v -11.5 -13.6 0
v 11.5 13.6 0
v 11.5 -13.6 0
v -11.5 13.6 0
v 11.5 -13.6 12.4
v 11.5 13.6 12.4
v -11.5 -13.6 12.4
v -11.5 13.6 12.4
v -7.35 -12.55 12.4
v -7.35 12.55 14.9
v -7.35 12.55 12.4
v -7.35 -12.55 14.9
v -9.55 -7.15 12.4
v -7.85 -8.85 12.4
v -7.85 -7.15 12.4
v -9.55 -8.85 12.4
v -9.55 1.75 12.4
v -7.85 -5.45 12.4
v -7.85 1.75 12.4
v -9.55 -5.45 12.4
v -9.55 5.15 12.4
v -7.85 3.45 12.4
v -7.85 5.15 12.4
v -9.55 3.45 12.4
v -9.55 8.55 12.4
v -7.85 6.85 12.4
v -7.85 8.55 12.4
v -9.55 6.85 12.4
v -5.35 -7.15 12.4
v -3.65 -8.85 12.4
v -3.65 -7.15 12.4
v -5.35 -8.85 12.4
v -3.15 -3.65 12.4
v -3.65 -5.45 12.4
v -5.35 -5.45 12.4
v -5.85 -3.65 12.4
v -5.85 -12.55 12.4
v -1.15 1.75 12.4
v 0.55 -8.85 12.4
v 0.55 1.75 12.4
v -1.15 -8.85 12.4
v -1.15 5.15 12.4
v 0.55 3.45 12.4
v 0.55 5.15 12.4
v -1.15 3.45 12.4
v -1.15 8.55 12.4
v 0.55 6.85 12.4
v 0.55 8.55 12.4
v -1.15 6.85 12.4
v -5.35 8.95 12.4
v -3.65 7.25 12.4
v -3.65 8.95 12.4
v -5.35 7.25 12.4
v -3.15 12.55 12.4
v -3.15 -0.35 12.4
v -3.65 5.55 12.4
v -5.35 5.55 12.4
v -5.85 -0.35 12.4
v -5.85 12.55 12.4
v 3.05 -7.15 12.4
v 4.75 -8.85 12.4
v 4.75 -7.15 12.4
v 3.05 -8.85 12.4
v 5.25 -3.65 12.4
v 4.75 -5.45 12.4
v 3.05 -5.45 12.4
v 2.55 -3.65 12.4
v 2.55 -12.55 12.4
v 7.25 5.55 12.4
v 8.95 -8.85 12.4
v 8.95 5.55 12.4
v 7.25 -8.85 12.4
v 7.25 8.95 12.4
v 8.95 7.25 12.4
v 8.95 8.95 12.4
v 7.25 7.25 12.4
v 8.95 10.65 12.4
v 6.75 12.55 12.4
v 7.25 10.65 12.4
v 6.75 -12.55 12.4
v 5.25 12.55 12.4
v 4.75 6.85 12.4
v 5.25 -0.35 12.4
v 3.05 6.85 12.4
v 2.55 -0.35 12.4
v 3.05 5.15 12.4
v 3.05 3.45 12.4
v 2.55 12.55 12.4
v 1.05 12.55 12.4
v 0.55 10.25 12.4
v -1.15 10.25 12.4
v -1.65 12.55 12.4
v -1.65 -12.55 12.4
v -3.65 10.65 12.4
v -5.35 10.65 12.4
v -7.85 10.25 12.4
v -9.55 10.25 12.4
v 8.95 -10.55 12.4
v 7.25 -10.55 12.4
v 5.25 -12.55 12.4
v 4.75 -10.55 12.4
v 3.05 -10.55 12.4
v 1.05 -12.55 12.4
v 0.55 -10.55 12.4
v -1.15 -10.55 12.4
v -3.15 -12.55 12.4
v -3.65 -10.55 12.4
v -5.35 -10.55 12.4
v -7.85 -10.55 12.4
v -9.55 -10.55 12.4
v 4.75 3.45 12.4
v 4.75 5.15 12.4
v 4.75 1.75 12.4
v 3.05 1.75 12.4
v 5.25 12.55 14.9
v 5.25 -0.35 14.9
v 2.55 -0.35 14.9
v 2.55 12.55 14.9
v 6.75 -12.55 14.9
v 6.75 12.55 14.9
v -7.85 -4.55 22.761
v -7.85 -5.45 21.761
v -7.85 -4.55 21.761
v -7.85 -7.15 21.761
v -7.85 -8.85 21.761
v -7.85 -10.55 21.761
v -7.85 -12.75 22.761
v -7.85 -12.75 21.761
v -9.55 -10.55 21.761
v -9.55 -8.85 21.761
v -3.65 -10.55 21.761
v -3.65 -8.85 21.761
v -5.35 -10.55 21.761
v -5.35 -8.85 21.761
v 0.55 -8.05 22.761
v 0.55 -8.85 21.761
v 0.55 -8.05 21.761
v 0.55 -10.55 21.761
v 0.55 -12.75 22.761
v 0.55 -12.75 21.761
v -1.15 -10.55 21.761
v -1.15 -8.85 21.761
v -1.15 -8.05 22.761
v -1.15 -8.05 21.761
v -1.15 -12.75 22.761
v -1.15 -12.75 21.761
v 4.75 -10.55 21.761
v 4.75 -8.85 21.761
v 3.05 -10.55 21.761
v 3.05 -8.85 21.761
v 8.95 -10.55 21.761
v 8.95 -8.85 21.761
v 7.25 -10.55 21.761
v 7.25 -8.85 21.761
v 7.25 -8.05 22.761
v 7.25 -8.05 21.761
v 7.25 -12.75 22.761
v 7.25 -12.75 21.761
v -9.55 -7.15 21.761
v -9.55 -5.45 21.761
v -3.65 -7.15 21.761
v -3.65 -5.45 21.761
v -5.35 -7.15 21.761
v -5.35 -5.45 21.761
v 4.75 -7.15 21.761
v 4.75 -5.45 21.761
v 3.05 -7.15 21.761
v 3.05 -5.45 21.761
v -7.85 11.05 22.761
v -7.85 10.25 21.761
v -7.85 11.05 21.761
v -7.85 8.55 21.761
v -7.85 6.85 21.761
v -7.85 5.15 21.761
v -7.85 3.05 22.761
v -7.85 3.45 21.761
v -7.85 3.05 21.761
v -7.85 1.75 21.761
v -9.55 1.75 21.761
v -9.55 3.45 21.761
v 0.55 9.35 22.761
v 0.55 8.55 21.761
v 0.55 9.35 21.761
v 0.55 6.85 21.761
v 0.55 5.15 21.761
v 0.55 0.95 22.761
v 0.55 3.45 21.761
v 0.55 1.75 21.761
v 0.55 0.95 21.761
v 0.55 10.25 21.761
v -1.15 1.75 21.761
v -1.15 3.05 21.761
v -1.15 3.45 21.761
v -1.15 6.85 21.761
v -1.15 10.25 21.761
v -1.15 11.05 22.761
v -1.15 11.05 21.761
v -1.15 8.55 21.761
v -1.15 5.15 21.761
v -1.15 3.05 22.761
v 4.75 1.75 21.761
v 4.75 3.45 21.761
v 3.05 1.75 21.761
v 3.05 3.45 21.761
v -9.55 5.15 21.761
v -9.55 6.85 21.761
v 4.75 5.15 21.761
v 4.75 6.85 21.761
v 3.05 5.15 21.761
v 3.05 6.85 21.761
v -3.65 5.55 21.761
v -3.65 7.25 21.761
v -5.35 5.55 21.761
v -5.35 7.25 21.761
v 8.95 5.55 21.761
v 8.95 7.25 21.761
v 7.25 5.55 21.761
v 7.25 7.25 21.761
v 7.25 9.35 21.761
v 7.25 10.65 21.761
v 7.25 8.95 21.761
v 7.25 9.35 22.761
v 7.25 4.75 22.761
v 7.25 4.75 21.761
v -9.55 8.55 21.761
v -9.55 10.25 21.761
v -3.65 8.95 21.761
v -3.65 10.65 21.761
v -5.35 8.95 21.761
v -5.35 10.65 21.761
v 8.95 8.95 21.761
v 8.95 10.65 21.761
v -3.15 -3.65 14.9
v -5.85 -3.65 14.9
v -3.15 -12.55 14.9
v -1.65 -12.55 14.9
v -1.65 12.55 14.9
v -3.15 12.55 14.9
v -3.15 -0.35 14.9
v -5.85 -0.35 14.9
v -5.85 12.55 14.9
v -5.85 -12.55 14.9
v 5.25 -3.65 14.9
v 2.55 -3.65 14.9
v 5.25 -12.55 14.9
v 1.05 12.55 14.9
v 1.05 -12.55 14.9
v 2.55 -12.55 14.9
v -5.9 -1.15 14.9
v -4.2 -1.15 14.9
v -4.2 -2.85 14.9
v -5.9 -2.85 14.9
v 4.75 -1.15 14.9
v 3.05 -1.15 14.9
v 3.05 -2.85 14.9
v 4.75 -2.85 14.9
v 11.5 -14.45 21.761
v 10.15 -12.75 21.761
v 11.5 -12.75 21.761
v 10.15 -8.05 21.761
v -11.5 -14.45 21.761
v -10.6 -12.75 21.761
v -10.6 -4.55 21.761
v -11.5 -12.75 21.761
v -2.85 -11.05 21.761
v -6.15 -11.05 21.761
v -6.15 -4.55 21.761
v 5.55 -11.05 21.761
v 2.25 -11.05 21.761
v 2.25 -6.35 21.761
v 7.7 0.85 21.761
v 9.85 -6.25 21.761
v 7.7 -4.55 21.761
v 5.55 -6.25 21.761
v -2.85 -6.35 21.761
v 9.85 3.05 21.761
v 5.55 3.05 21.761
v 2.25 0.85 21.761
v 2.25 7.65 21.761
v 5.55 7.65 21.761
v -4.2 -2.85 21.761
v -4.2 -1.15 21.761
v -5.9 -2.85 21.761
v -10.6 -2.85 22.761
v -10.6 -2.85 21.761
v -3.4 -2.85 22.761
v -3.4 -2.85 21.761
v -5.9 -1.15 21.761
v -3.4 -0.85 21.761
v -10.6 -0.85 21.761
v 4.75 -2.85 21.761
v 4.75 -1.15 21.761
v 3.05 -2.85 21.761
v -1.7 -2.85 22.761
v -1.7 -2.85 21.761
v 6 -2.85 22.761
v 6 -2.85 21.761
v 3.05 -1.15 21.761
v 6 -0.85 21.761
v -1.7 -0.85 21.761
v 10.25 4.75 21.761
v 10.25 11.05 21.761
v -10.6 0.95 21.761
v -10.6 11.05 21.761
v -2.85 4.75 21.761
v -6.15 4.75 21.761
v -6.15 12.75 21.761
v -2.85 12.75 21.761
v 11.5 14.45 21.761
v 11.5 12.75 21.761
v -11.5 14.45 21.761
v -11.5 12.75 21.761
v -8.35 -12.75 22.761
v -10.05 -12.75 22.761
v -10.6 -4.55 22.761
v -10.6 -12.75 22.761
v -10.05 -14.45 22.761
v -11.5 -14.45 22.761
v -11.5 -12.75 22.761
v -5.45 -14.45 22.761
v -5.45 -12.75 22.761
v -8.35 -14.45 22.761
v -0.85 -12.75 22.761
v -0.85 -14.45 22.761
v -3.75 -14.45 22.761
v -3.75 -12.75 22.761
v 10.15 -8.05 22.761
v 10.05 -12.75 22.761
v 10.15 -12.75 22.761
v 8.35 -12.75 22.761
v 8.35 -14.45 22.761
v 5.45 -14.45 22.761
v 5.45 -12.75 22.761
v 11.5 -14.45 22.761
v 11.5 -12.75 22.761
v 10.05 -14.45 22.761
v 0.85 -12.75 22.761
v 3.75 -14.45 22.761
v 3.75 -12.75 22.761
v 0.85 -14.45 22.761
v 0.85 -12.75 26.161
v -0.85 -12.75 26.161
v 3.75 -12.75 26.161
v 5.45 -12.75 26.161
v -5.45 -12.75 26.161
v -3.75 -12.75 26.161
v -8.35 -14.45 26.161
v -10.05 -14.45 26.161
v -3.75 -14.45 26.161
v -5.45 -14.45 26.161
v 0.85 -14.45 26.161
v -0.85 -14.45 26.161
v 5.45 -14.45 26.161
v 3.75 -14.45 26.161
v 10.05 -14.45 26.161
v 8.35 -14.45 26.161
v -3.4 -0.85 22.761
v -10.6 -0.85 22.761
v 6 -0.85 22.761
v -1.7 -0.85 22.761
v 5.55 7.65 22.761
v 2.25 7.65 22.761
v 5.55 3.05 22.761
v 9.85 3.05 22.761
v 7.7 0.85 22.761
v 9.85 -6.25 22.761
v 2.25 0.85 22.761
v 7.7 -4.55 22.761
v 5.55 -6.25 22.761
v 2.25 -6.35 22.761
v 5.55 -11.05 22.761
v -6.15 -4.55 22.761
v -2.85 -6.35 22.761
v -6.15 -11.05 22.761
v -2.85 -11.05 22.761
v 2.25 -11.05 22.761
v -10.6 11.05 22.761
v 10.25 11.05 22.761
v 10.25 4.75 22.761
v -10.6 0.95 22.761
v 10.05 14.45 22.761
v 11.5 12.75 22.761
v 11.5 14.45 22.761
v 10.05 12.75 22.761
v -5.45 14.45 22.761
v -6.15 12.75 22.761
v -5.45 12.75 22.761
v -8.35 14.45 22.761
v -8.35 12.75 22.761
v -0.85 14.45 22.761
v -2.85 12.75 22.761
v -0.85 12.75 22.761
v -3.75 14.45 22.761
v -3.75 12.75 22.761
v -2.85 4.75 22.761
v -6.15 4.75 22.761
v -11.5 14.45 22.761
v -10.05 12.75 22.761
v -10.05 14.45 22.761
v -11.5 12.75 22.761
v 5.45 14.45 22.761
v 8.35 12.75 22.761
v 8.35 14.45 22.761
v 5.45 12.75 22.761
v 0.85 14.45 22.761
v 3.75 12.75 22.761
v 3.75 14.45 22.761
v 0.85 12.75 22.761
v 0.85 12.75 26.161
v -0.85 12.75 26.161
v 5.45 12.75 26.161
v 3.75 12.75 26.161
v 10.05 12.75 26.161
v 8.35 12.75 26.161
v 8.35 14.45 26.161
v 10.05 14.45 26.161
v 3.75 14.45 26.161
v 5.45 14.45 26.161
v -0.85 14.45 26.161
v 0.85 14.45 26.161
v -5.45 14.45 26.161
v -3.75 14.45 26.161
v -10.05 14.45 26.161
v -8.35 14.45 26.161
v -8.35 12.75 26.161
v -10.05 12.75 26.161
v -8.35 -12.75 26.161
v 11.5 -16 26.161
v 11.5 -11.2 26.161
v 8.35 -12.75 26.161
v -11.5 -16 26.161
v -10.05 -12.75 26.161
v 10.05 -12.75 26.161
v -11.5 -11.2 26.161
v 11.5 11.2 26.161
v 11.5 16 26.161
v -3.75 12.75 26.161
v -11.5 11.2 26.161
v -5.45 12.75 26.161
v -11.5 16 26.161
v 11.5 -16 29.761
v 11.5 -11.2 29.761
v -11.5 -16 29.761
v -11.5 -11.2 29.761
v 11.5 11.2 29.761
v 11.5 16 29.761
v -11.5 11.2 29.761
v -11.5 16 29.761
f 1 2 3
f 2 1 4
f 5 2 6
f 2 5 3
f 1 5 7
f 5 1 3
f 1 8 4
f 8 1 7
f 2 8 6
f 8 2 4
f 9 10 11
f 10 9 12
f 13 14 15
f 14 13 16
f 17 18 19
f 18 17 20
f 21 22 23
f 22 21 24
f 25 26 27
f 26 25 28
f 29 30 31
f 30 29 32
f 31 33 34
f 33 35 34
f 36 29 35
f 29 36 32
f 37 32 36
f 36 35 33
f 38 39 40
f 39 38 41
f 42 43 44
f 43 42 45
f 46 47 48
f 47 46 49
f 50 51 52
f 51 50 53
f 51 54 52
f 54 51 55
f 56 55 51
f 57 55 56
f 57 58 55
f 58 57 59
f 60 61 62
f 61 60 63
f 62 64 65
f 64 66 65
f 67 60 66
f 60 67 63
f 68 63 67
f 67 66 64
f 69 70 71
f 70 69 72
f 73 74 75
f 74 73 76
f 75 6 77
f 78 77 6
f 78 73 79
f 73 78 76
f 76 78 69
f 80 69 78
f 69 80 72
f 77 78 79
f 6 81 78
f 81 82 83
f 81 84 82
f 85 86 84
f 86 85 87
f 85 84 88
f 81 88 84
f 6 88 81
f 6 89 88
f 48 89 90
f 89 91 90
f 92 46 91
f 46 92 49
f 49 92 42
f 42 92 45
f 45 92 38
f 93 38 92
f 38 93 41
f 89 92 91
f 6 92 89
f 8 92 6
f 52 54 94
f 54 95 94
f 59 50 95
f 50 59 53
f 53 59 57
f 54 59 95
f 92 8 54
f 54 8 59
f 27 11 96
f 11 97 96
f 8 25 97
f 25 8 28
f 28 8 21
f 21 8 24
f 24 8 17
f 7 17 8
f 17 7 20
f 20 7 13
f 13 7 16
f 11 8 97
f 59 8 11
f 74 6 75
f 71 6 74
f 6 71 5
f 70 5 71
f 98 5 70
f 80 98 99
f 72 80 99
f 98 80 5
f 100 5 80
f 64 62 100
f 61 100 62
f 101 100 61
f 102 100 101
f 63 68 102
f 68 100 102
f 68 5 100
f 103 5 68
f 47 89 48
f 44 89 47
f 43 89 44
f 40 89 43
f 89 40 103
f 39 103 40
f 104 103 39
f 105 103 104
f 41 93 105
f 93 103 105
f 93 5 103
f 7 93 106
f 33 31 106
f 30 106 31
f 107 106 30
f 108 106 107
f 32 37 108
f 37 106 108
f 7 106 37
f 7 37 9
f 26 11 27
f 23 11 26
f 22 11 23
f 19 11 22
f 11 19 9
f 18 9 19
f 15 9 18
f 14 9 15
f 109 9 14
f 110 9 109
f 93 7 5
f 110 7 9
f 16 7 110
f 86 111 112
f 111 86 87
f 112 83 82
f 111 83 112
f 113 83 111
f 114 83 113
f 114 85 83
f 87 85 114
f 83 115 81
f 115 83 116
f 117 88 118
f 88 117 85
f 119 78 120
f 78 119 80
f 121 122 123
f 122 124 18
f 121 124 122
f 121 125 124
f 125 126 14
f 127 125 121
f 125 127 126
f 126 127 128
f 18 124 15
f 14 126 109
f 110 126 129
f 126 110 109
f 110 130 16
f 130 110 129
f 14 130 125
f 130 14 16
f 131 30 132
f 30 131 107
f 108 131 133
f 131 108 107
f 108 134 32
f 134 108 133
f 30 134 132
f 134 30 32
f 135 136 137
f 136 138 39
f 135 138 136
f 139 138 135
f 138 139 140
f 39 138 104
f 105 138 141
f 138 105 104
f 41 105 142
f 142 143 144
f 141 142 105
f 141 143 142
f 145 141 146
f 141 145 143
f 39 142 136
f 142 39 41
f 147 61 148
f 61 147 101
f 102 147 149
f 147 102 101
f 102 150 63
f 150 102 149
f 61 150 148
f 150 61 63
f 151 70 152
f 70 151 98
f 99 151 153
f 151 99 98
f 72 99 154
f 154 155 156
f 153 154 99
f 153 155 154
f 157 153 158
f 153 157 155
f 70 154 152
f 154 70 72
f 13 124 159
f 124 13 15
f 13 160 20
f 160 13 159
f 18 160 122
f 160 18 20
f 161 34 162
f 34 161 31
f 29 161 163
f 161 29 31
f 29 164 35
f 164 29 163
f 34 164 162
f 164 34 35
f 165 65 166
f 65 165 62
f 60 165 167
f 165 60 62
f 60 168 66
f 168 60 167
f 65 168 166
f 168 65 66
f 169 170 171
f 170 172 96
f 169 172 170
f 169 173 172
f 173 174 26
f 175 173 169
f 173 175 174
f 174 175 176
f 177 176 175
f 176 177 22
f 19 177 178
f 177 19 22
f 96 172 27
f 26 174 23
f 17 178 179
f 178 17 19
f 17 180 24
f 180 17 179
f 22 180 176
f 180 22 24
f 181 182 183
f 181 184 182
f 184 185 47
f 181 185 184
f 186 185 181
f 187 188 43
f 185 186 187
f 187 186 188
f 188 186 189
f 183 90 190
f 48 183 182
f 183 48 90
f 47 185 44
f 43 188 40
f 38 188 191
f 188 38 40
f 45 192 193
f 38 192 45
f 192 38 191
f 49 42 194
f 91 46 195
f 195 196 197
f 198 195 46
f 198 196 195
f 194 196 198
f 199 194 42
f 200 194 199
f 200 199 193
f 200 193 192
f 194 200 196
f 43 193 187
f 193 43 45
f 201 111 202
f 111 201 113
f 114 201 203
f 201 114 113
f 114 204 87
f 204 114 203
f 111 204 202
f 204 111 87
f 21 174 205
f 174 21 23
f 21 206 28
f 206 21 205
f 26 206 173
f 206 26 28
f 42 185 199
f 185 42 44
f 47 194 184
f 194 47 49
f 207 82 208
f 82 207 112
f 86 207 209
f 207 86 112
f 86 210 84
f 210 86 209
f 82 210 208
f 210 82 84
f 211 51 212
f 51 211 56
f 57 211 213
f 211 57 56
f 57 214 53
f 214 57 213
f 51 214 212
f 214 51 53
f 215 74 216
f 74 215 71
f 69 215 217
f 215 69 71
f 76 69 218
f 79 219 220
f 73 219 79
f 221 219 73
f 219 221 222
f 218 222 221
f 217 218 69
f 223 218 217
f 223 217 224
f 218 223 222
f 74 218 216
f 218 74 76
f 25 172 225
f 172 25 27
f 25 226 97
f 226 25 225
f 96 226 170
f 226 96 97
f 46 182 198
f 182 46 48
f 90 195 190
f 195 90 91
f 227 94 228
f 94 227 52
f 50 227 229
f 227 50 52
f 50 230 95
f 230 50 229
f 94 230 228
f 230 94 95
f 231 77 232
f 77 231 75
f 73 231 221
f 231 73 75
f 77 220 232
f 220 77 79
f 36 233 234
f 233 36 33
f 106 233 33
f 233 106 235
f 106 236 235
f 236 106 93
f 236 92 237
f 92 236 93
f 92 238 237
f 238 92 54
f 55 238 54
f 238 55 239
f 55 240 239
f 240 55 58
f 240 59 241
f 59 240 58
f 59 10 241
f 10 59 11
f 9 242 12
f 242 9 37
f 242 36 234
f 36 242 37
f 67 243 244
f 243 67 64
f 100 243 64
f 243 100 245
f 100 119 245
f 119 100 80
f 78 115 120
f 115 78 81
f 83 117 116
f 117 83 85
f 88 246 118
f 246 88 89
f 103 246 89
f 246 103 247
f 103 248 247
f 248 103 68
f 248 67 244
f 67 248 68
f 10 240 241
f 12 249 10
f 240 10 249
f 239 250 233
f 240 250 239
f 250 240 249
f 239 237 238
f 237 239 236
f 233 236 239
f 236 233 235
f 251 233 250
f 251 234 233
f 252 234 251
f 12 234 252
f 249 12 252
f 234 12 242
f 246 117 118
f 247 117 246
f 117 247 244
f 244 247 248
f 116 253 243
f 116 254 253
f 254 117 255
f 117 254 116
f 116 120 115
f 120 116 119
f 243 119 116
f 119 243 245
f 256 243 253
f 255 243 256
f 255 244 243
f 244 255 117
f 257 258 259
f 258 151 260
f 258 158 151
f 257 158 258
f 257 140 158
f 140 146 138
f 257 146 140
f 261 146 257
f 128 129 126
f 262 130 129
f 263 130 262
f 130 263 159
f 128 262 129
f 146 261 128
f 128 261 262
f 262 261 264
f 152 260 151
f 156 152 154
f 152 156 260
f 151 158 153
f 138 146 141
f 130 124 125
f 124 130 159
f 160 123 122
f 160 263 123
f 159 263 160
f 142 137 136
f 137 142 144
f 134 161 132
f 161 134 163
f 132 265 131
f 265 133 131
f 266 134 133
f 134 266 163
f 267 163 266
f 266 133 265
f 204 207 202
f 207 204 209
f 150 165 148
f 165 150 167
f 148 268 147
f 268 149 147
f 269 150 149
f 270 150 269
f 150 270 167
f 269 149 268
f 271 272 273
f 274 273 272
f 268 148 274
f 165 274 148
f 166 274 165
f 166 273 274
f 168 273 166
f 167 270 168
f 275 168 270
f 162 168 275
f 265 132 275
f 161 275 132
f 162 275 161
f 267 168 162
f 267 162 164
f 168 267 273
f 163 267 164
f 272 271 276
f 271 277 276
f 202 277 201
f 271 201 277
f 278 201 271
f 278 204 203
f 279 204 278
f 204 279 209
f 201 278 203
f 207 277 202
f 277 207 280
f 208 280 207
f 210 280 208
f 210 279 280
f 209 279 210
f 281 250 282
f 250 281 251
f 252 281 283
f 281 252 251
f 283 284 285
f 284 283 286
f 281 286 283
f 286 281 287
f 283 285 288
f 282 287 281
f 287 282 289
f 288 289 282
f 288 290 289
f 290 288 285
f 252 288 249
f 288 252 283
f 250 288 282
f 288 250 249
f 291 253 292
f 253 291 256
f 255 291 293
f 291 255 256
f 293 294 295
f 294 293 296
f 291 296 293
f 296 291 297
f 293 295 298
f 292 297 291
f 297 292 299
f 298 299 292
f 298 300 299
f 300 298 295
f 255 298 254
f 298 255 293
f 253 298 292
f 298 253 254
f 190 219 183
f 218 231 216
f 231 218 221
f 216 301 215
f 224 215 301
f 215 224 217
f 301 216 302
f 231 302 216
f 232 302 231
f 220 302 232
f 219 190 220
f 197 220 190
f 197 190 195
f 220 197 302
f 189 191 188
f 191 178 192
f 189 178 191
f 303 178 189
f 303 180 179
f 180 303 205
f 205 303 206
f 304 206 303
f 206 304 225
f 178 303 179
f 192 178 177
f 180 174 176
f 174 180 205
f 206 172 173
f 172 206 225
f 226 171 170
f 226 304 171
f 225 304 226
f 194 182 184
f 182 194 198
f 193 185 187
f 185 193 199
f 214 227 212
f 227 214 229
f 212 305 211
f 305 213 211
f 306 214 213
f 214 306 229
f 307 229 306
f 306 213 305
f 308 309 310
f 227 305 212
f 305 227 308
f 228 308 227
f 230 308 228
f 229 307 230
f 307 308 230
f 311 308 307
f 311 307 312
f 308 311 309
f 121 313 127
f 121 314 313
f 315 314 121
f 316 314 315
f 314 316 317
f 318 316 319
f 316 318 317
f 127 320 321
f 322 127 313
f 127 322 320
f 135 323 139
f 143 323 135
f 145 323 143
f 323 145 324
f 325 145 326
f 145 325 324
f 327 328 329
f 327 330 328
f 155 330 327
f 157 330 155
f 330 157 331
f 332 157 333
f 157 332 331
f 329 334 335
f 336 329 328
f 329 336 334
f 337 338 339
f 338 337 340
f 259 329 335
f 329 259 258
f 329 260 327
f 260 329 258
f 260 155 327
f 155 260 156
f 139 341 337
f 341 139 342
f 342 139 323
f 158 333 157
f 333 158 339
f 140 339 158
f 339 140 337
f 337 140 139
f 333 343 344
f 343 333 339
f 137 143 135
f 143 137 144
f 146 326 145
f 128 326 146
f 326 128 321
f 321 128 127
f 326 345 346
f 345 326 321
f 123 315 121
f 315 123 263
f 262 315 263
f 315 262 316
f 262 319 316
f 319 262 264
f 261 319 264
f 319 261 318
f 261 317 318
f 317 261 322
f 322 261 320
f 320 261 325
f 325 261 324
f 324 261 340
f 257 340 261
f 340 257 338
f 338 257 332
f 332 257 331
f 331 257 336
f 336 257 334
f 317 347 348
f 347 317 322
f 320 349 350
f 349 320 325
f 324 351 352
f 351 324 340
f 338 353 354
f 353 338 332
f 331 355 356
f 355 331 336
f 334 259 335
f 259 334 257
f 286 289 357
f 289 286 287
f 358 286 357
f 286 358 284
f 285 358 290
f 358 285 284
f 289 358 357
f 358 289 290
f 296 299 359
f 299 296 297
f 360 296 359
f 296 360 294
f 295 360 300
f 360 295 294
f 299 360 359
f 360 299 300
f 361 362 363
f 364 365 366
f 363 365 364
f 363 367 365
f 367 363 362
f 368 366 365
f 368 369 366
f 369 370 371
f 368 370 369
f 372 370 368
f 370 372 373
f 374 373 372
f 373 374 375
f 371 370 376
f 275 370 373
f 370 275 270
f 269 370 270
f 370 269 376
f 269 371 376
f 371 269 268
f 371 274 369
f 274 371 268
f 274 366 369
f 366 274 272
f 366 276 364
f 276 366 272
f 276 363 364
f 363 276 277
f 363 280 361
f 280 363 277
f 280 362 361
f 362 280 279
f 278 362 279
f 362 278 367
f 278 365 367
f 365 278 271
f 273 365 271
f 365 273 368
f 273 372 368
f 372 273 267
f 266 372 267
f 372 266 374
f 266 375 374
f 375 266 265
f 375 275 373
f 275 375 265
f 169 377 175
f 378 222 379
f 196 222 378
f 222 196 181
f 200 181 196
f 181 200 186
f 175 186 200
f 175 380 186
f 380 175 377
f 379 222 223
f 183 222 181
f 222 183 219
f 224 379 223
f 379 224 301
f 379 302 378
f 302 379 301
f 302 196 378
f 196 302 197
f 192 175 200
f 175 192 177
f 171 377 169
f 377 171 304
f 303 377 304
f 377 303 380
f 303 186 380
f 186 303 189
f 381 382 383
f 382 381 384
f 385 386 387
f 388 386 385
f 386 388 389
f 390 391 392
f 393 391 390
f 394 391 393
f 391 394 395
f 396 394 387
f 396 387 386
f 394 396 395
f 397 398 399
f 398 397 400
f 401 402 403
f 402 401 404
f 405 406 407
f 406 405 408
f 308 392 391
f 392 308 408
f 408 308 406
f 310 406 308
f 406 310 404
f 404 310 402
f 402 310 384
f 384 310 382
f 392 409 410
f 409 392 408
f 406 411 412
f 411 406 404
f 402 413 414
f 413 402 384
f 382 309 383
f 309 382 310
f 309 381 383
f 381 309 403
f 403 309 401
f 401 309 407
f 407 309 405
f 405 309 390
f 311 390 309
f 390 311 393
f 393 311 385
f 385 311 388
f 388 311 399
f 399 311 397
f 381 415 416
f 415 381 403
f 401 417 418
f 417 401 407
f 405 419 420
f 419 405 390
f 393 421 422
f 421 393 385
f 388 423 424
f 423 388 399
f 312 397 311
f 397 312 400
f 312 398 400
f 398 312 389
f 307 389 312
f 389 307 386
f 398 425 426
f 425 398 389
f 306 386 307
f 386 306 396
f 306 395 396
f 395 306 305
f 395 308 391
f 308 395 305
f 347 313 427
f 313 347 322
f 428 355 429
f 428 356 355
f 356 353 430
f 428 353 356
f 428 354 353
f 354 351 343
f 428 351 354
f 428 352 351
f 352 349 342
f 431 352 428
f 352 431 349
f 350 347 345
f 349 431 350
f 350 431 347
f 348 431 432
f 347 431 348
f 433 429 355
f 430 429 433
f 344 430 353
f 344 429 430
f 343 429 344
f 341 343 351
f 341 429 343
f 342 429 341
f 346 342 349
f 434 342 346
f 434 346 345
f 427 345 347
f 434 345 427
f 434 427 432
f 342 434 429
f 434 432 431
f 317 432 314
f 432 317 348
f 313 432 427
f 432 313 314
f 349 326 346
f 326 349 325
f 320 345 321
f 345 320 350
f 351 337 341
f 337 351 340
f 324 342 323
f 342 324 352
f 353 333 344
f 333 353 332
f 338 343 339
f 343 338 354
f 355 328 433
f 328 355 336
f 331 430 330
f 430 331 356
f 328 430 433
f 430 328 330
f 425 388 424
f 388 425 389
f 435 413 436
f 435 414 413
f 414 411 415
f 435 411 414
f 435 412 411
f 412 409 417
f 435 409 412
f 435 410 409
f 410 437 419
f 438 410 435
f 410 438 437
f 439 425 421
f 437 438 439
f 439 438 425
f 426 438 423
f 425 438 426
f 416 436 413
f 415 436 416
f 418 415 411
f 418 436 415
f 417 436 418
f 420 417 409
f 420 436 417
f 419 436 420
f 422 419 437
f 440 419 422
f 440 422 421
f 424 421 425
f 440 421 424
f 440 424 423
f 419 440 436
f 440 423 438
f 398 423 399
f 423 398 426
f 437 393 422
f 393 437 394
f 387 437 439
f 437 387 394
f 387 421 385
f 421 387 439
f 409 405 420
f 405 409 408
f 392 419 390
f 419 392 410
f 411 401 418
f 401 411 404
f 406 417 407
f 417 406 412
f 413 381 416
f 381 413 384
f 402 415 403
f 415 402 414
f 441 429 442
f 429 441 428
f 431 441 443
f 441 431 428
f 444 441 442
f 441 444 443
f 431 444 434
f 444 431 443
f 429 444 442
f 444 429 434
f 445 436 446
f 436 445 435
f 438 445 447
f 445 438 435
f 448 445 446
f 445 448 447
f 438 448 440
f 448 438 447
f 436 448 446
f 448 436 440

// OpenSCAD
// Generated by SolidPython 0.4.2 on 2020-09-29 23:21:31
//!OpenSCAD

scale(v = 0.0100000000) {
	translate(v = [-1150, -1360, 0]) {
		union() {
			color(c = [0.4000000000, 0.4000000000, 0.4000000000]) {
				translate(v = [0, 0, 0]) {
					linear_extrude(height = 1000.0000000000) {
						polygon(paths = [[0, 1, 2, 3]], points = [[0, 0], [0, 2720], [2300, 2720], [2300, 0]]);
					}
				}
			}
			color(c = [0.2000000000, 0.6000000000, 0.2000000000]) {
				translate(v = [0, 0, 1000.0000000000]) {
					linear_extrude(height = 120.0000000000) {
						polygon(paths = [[0, 1, 2, 3]], points = [[0, 1305], [0, 2720], [2300, 2720], [2300, 1305]]);
					}
				}
			}
			color(c = [0.4000000000, 0.4000000000, 0.4000000000]) {
				translate(v = [0, 0, 1000.0000000000]) {
					linear_extrude(height = 120.0000000000) {
						polygon(paths = [[0, 1, 2, 3]], points = [[0, 0], [0, 1305], [2300, 1305], [2300, 0]]);
					}
				}
			}
			color(c = [0.9000000000, 0.6000000000, 0.6000000000]) {
				translate(v = [0, 0, 1120.0000000000]) {
					linear_extrude(height = 120.0000000000) {
						polygon(paths = [[0, 1, 2, 3]], points = [[135, 1485], [135, 2485], [415, 2485], [415, 1485]]);
					}
				}
			}
			color(c = [0.9000000000, 0.6000000000, 0.6000000000]) {
				translate(v = [0, 0, 1120.0000000000]) {
					linear_extrude(height = 120.0000000000) {
						polygon(paths = [[0, 1, 2, 3]], points = [[565, 1485], [565, 2485], [835, 2485], [835, 1485]]);
					}
				}
			}
			color(c = [0.9000000000, 0.6000000000, 0.6000000000]) {
				translate(v = [0, 0, 1120.0000000000]) {
					linear_extrude(height = 120.0000000000) {
						polygon(paths = [[0, 1, 2, 3]], points = [[985, 1485], [985, 2485], [1255, 2485], [1255, 1485]]);
					}
				}
			}
			color(c = [0.9000000000, 0.6000000000, 0.6000000000]) {
				translate(v = [0, 0, 1120.0000000000]) {
					linear_extrude(height = 120.0000000000) {
						polygon(paths = [[0, 1, 2, 3]], points = [[1405, 1485], [1405, 2485], [1675, 2485], [1675, 1485]]);
					}
				}
			}
			color(c = [0.9000000000, 0.6000000000, 0.6000000000]) {
				translate(v = [0, 0, 1120.0000000000]) {
					linear_extrude(height = 120.0000000000) {
						polygon(paths = [[0, 1, 2, 3]], points = [[1825, 1485], [1825, 2485], [2085, 2485], [2085, 1485]]);
					}
				}
			}
			color(c = [0.9000000000, 0.6000000000, 0.9000000000]) {
				translate(v = [0, 0, 1120.0000000000]) {
					linear_extrude(height = 120.0000000000) {
						polygon(paths = [[0, 1, 2, 3]], points = [[135, 235], [135, 885], [415, 885], [415, 235]]);
					}
				}
			}
			color(c = [0.9000000000, 0.6000000000, 0.9000000000]) {
				translate(v = [0, 0, 1120.0000000000]) {
					linear_extrude(height = 120.0000000000) {
						polygon(paths = [[0, 1, 2, 3]], points = [[565, 235], [565, 885], [835, 885], [835, 235]]);
					}
				}
			}
			color(c = [0.9000000000, 0.6000000000, 0.9000000000]) {
				translate(v = [0, 0, 1120.0000000000]) {
					linear_extrude(height = 120.0000000000) {
						polygon(paths = [[0, 1, 2, 3]], points = [[985, 235], [985, 885], [1255, 885], [1255, 235]]);
					}
				}
			}
			color(c = [0.9000000000, 0.6000000000, 0.9000000000]) {
				translate(v = [0, 0, 1120.0000000000]) {
					linear_extrude(height = 120.0000000000) {
						polygon(paths = [[0, 1, 2, 3]], points = [[1405, 235], [1405, 885], [1675, 885], [1675, 235]]);
					}
				}
			}
			color(c = [0.9000000000, 0.6000000000, 0.9000000000]) {
				translate(v = [0, 0, 1120.0000000000]) {
					linear_extrude(height = 120.0000000000) {
						polygon(paths = [[0, 1, 2, 3]], points = [[1825, 235], [1825, 885], [2085, 885], [2085, 235]]);
					}
				}
			}
			color(c = [0.2000000000, 0.6000000000, 0.2000000000]) {
				translate(v = [0, 0, 1120.0000000000]) {
					linear_extrude(height = 120.0000000000) {
						difference() {
							polygon(paths = [[0, 1, 2, 3]], points = [[0, 1305], [0, 2720], [2300, 2720], [2300, 1305]]);
							polygon(paths = [[0, 1, 2, 3]], points = [[135, 1485], [415, 1485], [415, 2485], [135, 2485]]);
							polygon(paths = [[0, 1, 2, 3]], points = [[565, 1485], [835, 1485], [835, 2485], [565, 2485]]);
							polygon(paths = [[0, 1, 2, 3]], points = [[985, 1485], [1255, 1485], [1255, 2485], [985, 2485]]);
							polygon(paths = [[0, 1, 2, 3]], points = [[1405, 1485], [1675, 1485], [1675, 2485], [1405, 2485]]);
							polygon(paths = [[0, 1, 2, 3]], points = [[1825, 1485], [2085, 1485], [2085, 2485], [1825, 2485]]);
						}
					}
				}
			}
			color(c = [0.4000000000, 0.4000000000, 0.4000000000]) {
				translate(v = [0, 0, 1120.0000000000]) {
					linear_extrude(height = 120.0000000000) {
						difference() {
							polygon(paths = [[0, 1, 2, 3]], points = [[0, 0], [0, 1305], [2300, 1305], [2300, 0]]);
							polygon(paths = [[0, 1, 2, 3]], points = [[135, 235], [415, 235], [415, 885], [135, 885]]);
							polygon(paths = [[0, 1, 2, 3]], points = [[565, 235], [835, 235], [835, 885], [565, 885]]);
							polygon(paths = [[0, 1, 2, 3]], points = [[985, 235], [1255, 235], [1255, 885], [985, 885]]);
							polygon(paths = [[0, 1, 2, 3]], points = [[1405, 235], [1675, 235], [1675, 885], [1405, 885]]);
							polygon(paths = [[0, 1, 2, 3]], points = [[1825, 235], [2085, 235], [2085, 885], [1825, 885]]);
						}
					}
				}
			}
			color(c = [0.1000000000, 0.1000000000, 0.1000000000]) {
				translate(v = [0, 0, 1240.0000000000]) {
					linear_extrude(height = 70.0000000000) {
						polygon(paths = [[0, 1, 2, 3]], points = [[195, 305], [195, 475], [365, 475], [365, 305]]);
					}
				}
			}
			color(c = [0.1000000000, 0.1000000000, 0.1000000000]) {
				translate(v = [0, 0, 1240.0000000000]) {
					linear_extrude(height = 70.0000000000) {
						polygon(paths = [[0, 1, 2, 3]], points = [[615, 305], [615, 475], [785, 475], [785, 305]]);
					}
				}
			}
			color(c = [0.1000000000, 0.1000000000, 0.1000000000]) {
				translate(v = [0, 0, 1240.0000000000]) {
					linear_extrude(height = 70.0000000000) {
						polygon(paths = [[0, 1, 2, 3]], points = [[1035, 305], [1035, 475], [1205, 475], [1205, 305]]);
					}
				}
			}
			color(c = [0.1000000000, 0.1000000000, 0.1000000000]) {
				translate(v = [0, 0, 1240.0000000000]) {
					linear_extrude(height = 70.0000000000) {
						polygon(paths = [[0, 1, 2, 3]], points = [[1455, 305], [1455, 475], [1625, 475], [1625, 305]]);
					}
				}
			}
			color(c = [0.1000000000, 0.1000000000, 0.1000000000]) {
				translate(v = [0, 0, 1240.0000000000]) {
					linear_extrude(height = 70.0000000000) {
						polygon(paths = [[0, 1, 2, 3]], points = [[1875, 305], [1875, 475], [2045, 475], [2045, 305]]);
					}
				}
			}
			color(c = [0.1000000000, 0.1000000000, 0.1000000000]) {
				translate(v = [0, 0, 1240.0000000000]) {
					linear_extrude(height = 70.0000000000) {
						polygon(paths = [[0, 1, 2, 3]], points = [[195, 645], [195, 815], [365, 815], [365, 645]]);
					}
				}
			}
			color(c = [0.1000000000, 0.1000000000, 0.1000000000]) {
				translate(v = [0, 0, 1240.0000000000]) {
					linear_extrude(height = 70.0000000000) {
						polygon(paths = [[0, 1, 2, 3]], points = [[615, 645], [615, 815], [785, 815], [785, 645]]);
					}
				}
			}
			color(c = [0.1000000000, 0.1000000000, 0.1000000000]) {
				translate(v = [0, 0, 1240.0000000000]) {
					linear_extrude(height = 70.0000000000) {
						polygon(paths = [[0, 1, 2, 3]], points = [[1455, 645], [1455, 815], [1625, 815], [1625, 645]]);
					}
				}
			}
			color(c = [0.1000000000, 0.1000000000, 0.1000000000]) {
				translate(v = [0, 0, 1240.0000000000]) {
					linear_extrude(height = 70.0000000000) {
						polygon(paths = [[0, 1, 2, 3]], points = [[195, 1535], [195, 1705], [365, 1705], [365, 1535]]);
					}
				}
			}
			color(c = [0.1000000000, 0.1000000000, 0.1000000000]) {
				translate(v = [0, 0, 1240.0000000000]) {
					linear_extrude(height = 70.0000000000) {
						polygon(paths = [[0, 1, 2, 3]], points = [[1035, 1535], [1035, 1705], [1205, 1705], [1205, 1535]]);
					}
				}
			}
			color(c = [0.1000000000, 0.1000000000, 0.1000000000]) {
				translate(v = [0, 0, 1240.0000000000]) {
					linear_extrude(height = 70.0000000000) {
						polygon(paths = [[0, 1, 2, 3]], points = [[1455, 1535], [1455, 1705], [1625, 1705], [1625, 1535]]);
					}
				}
			}
			color(c = [0.1000000000, 0.1000000000, 0.1000000000]) {
				translate(v = [0, 0, 1240.0000000000]) {
					linear_extrude(height = 70.0000000000) {
						polygon(paths = [[0, 1, 2, 3]], points = [[195, 1875], [195, 2045], [365, 2045], [365, 1875]]);
					}
				}
			}
			color(c = [0.1000000000, 0.1000000000, 0.1000000000]) {
				translate(v = [0, 0, 1240.0000000000]) {
					linear_extrude(height = 70.0000000000) {
						polygon(paths = [[0, 1, 2, 3]], points = [[1035, 1875], [1035, 2045], [1205, 2045], [1205, 1875]]);
					}
				}
			}
			color(c = [0.1000000000, 0.1000000000, 0.1000000000]) {
				translate(v = [0, 0, 1240.0000000000]) {
					linear_extrude(height = 70.0000000000) {
						polygon(paths = [[0, 1, 2, 3]], points = [[1455, 1875], [1455, 2045], [1625, 2045], [1625, 1875]]);
					}
				}
			}
			color(c = [0.1000000000, 0.1000000000, 0.1000000000]) {
				translate(v = [0, 0, 1240.0000000000]) {
					linear_extrude(height = 70.0000000000) {
						polygon(paths = [[0, 1, 2, 3]], points = [[615, 1915], [615, 2085], [785, 2085], [785, 1915]]);
					}
				}
			}
			color(c = [0.1000000000, 0.1000000000, 0.1000000000]) {
				translate(v = [0, 0, 1240.0000000000]) {
					linear_extrude(height = 70.0000000000) {
						polygon(paths = [[0, 1, 2, 3]], points = [[1875, 1915], [1875, 2085], [2045, 2085], [2045, 1915]]);
					}
				}
			}
			color(c = [0.1000000000, 0.1000000000, 0.1000000000]) {
				translate(v = [0, 0, 1240.0000000000]) {
					linear_extrude(height = 70.0000000000) {
						polygon(paths = [[0, 1, 2, 3]], points = [[195, 2215], [195, 2385], [365, 2385], [365, 2215]]);
					}
				}
			}
			color(c = [0.1000000000, 0.1000000000, 0.1000000000]) {
				translate(v = [0, 0, 1240.0000000000]) {
					linear_extrude(height = 70.0000000000) {
						polygon(paths = [[0, 1, 2, 3]], points = [[1035, 2215], [1035, 2385], [1205, 2385], [1205, 2215]]);
					}
				}
			}
			color(c = [0.1000000000, 0.1000000000, 0.1000000000]) {
				translate(v = [0, 0, 1240.0000000000]) {
					linear_extrude(height = 70.0000000000) {
						polygon(paths = [[0, 1, 2, 3]], points = [[615, 2255], [615, 2425], [785, 2425], [785, 2255]]);
					}
				}
			}
			color(c = [0.1000000000, 0.1000000000, 0.1000000000]) {
				translate(v = [0, 0, 1240.0000000000]) {
					linear_extrude(height = 70.0000000000) {
						polygon(paths = [[0, 1, 2, 3]], points = [[1875, 2255], [1875, 2425], [2045, 2425], [2045, 2255]]);
					}
				}
			}
			color(c = [1.0000000000, 1.0000000000, 1.0000000000]) {
				translate(v = [0, 0, 1240.0000000000]) {
					linear_extrude(height = 70.0000000000) {
						polygon(paths = [[0, 1, 2, 3, 4, 5, 6, 7, 8, 9, 10, 11]], points = [[415, 105], [415, 2615], [565, 2615], [565, 1325], [835, 1325], [835, 2615], [985, 2615], [985, 105], [835, 105], [835, 995], [565, 995], [565, 105]]);
					}
				}
			}
			color(c = [1.0000000000, 1.0000000000, 1.0000000000]) {
				translate(v = [0, 0, 1240.0000000000]) {
					linear_extrude(height = 70.0000000000) {
						polygon(paths = [[0, 1, 2, 3, 4, 5, 6, 7, 8, 9, 10, 11]], points = [[1255, 105], [1255, 2615], [1405, 2615], [1405, 1325], [1675, 1325], [1675, 2615], [1825, 2615], [1825, 105], [1675, 105], [1675, 995], [1405, 995], [1405, 105]]);
					}
				}
			}
			color(c = [0.1000000000, 0.1000000000, 0.1000000000]) {
				translate(v = [0, 0, 1310.0000000000]) {
					linear_extrude(height = 180.0000000000) {
						polygon(paths = [[0, 1, 2, 3]], points = [[195, 305], [195, 475], [365, 475], [365, 305]]);
					}
				}
			}
			color(c = [0.1000000000, 0.1000000000, 0.1000000000]) {
				translate(v = [0, 0, 1310.0000000000]) {
					linear_extrude(height = 180.0000000000) {
						polygon(paths = [[0, 1, 2, 3]], points = [[615, 305], [615, 475], [785, 475], [785, 305]]);
					}
				}
			}
			color(c = [0.1000000000, 0.1000000000, 0.1000000000]) {
				translate(v = [0, 0, 1310.0000000000]) {
					linear_extrude(height = 180.0000000000) {
						polygon(paths = [[0, 1, 2, 3]], points = [[1035, 305], [1035, 475], [1205, 475], [1205, 305]]);
					}
				}
			}
			color(c = [0.1000000000, 0.1000000000, 0.1000000000]) {
				translate(v = [0, 0, 1310.0000000000]) {
					linear_extrude(height = 180.0000000000) {
						polygon(paths = [[0, 1, 2, 3]], points = [[1455, 305], [1455, 475], [1625, 475], [1625, 305]]);
					}
				}
			}
			color(c = [0.1000000000, 0.1000000000, 0.1000000000]) {
				translate(v = [0, 0, 1310.0000000000]) {
					linear_extrude(height = 180.0000000000) {
						polygon(paths = [[0, 1, 2, 3]], points = [[1875, 305], [1875, 475], [2045, 475], [2045, 305]]);
					}
				}
			}
			color(c = [0.1000000000, 0.1000000000, 0.1000000000]) {
				translate(v = [0, 0, 1310.0000000000]) {
					linear_extrude(height = 180.0000000000) {
						polygon(paths = [[0, 1, 2, 3]], points = [[195, 645], [195, 815], [365, 815], [365, 645]]);
					}
				}
			}
			color(c = [0.1000000000, 0.1000000000, 0.1000000000]) {
				translate(v = [0, 0, 1310.0000000000]) {
					linear_extrude(height = 180.0000000000) {
						polygon(paths = [[0, 1, 2, 3]], points = [[615, 645], [615, 815], [785, 815], [785, 645]]);
					}
				}
			}
			color(c = [0.1000000000, 0.1000000000, 0.1000000000]) {
				translate(v = [0, 0, 1310.0000000000]) {
					linear_extrude(height = 180.0000000000) {
						polygon(paths = [[0, 1, 2, 3]], points = [[1455, 645], [1455, 815], [1625, 815], [1625, 645]]);
					}
				}
			}
			color(c = [0.1000000000, 0.1000000000, 0.1000000000]) {
				translate(v = [0, 0, 1310.0000000000]) {
					linear_extrude(height = 180.0000000000) {
						polygon(paths = [[0, 1, 2, 3]], points = [[195, 1535], [195, 1705], [365, 1705], [365, 1535]]);
					}
				}
			}
			color(c = [0.1000000000, 0.1000000000, 0.1000000000]) {
				translate(v = [0, 0, 1310.0000000000]) {
					linear_extrude(height = 180.0000000000) {
						polygon(paths = [[0, 1, 2, 3]], points = [[1035, 1535], [1035, 1705], [1205, 1705], [1205, 1535]]);
					}
				}
			}
			color(c = [0.1000000000, 0.1000000000, 0.1000000000]) {
				translate(v = [0, 0, 1310.0000000000]) {
					linear_extrude(height = 180.0000000000) {
						polygon(paths = [[0, 1, 2, 3]], points = [[1455, 1535], [1455, 1705], [1625, 1705], [1625, 1535]]);
					}
				}
			}
			color(c = [0.1000000000, 0.1000000000, 0.1000000000]) {
				translate(v = [0, 0, 1310.0000000000]) {
					linear_extrude(height = 180.0000000000) {
						polygon(paths = [[0, 1, 2, 3]], points = [[195, 1875], [195, 2045], [365, 2045], [365, 1875]]);
					}
				}
			}
			color(c = [0.1000000000, 0.1000000000, 0.1000000000]) {
				translate(v = [0, 0, 1310.0000000000]) {
					linear_extrude(height = 180.0000000000) {
						polygon(paths = [[0, 1, 2, 3]], points = [[1035, 1875], [1035, 2045], [1205, 2045], [1205, 1875]]);
					}
				}
			}
			color(c = [0.1000000000, 0.1000000000, 0.1000000000]) {
				translate(v = [0, 0, 1310.0000000000]) {
					linear_extrude(height = 180.0000000000) {
						polygon(paths = [[0, 1, 2, 3]], points = [[1455, 1875], [1455, 2045], [1625, 2045], [1625, 1875]]);
					}
				}
			}
			color(c = [0.1000000000, 0.1000000000, 0.1000000000]) {
				translate(v = [0, 0, 1310.0000000000]) {
					linear_extrude(height = 180.0000000000) {
						polygon(paths = [[0, 1, 2, 3]], points = [[615, 1915], [615, 2085], [785, 2085], [785, 1915]]);
					}
				}
			}
			color(c = [0.1000000000, 0.1000000000, 0.1000000000]) {
				translate(v = [0, 0, 1310.0000000000]) {
					linear_extrude(height = 180.0000000000) {
						polygon(paths = [[0, 1, 2, 3]], points = [[1875, 1915], [1875, 2085], [2045, 2085], [2045, 1915]]);
					}
				}
			}
			color(c = [0.1000000000, 0.1000000000, 0.1000000000]) {
				translate(v = [0, 0, 1310.0000000000]) {
					linear_extrude(height = 180.0000000000) {
						polygon(paths = [[0, 1, 2, 3]], points = [[195, 2215], [195, 2385], [365, 2385], [365, 2215]]);
					}
				}
			}
			color(c = [0.1000000000, 0.1000000000, 0.1000000000]) {
				translate(v = [0, 0, 1310.0000000000]) {
					linear_extrude(height = 180.0000000000) {
						polygon(paths = [[0, 1, 2, 3]], points = [[1035, 2215], [1035, 2385], [1205, 2385], [1205, 2215]]);
					}
				}
			}
			color(c = [0.1000000000, 0.1000000000, 0.1000000000]) {
				translate(v = [0, 0, 1310.0000000000]) {
					linear_extrude(height = 180.0000000000) {
						polygon(paths = [[0, 1, 2, 3]], points = [[615, 2255], [615, 2425], [785, 2425], [785, 2255]]);
					}
				}
			}
			color(c = [0.1000000000, 0.1000000000, 0.1000000000]) {
				translate(v = [0, 0, 1310.0000000000]) {
					linear_extrude(height = 180.0000000000) {
						polygon(paths = [[0, 1, 2, 3]], points = [[1875, 2255], [1875, 2425], [2045, 2425], [2045, 2255]]);
					}
				}
			}
			color(c = [0.7000000000, 0, 0]) {
				translate(v = [0, 0, 1310.0000000000]) {
					linear_extrude(height = 180.0000000000) {
						polygon(paths = [[0, 1, 2, 3, 4, 5, 6, 7, 8, 9, 10, 11]], points = [[415, 105], [415, 2615], [565, 2615], [565, 1325], [835, 1325], [835, 2615], [985, 2615], [985, 105], [835, 105], [835, 995], [565, 995], [565, 105]]);
					}
				}
			}
			color(c = [0.7000000000, 0, 0]) {
				translate(v = [0, 0, 1310.0000000000]) {
					linear_extrude(height = 180.0000000000) {
						polygon(paths = [[0, 1, 2, 3, 4, 5, 6, 7, 8, 9, 10, 11]], points = [[1255, 105], [1255, 2615], [1405, 2615], [1405, 1325], [1675, 1325], [1675, 2615], [1825, 2615], [1825, 105], [1675, 105], [1675, 995], [1405, 995], [1405, 105]]);
					}
				}
			}
			color(c = [0.1000000000, 0.1000000000, 0.1000000000]) {
				translate(v = [0, 0, 1490.0000000000]) {
					linear_extrude(height = 686.1000000000) {
						polygon(paths = [[0, 1, 2, 3]], points = [[195, 305], [195, 475], [365, 475], [365, 305]]);
					}
				}
			}
			color(c = [0.1000000000, 0.1000000000, 0.1000000000]) {
				translate(v = [0, 0, 1490.0000000000]) {
					linear_extrude(height = 686.1000000000) {
						polygon(paths = [[0, 1, 2, 3]], points = [[615, 305], [615, 475], [785, 475], [785, 305]]);
					}
				}
			}
			color(c = [0.1000000000, 0.1000000000, 0.1000000000]) {
				translate(v = [0, 0, 1490.0000000000]) {
					linear_extrude(height = 686.1000000000) {
						polygon(paths = [[0, 1, 2, 3]], points = [[1035, 305], [1035, 475], [1205, 475], [1205, 305]]);
					}
				}
			}
			color(c = [0.1000000000, 0.1000000000, 0.1000000000]) {
				translate(v = [0, 0, 1490.0000000000]) {
					linear_extrude(height = 686.1000000000) {
						polygon(paths = [[0, 1, 2, 3]], points = [[1455, 305], [1455, 475], [1625, 475], [1625, 305]]);
					}
				}
			}
			color(c = [0.1000000000, 0.1000000000, 0.1000000000]) {
				translate(v = [0, 0, 1490.0000000000]) {
					linear_extrude(height = 686.1000000000) {
						polygon(paths = [[0, 1, 2, 3]], points = [[1875, 305], [1875, 475], [2045, 475], [2045, 305]]);
					}
				}
			}
			color(c = [0.1000000000, 0.1000000000, 0.1000000000]) {
				translate(v = [0, 0, 1490.0000000000]) {
					linear_extrude(height = 686.1000000000) {
						polygon(paths = [[0, 1, 2, 3]], points = [[195, 645], [195, 815], [365, 815], [365, 645]]);
					}
				}
			}
			color(c = [0.1000000000, 0.1000000000, 0.1000000000]) {
				translate(v = [0, 0, 1490.0000000000]) {
					linear_extrude(height = 686.1000000000) {
						polygon(paths = [[0, 1, 2, 3]], points = [[615, 645], [615, 815], [785, 815], [785, 645]]);
					}
				}
			}
			color(c = [0.1000000000, 0.1000000000, 0.1000000000]) {
				translate(v = [0, 0, 1490.0000000000]) {
					linear_extrude(height = 686.1000000000) {
						polygon(paths = [[0, 1, 2, 3]], points = [[1455, 645], [1455, 815], [1625, 815], [1625, 645]]);
					}
				}
			}
			color(c = [0.1000000000, 0.1000000000, 0.1000000000]) {
				translate(v = [0, 0, 1490.0000000000]) {
					linear_extrude(height = 686.1000000000) {
						polygon(paths = [[0, 1, 2, 3]], points = [[560, 1075], [560, 1245], [730, 1245], [730, 1075]]);
					}
				}
			}
			color(c = [0.1000000000, 0.1000000000, 0.1000000000]) {
				translate(v = [0, 0, 1490.0000000000]) {
					linear_extrude(height = 686.1000000000) {
						polygon(paths = [[0, 1, 2, 3]], points = [[1455, 1075], [1455, 1245], [1625, 1245], [1625, 1075]]);
					}
				}
			}
			color(c = [0.1000000000, 0.1000000000, 0.1000000000]) {
				translate(v = [0, 0, 1490.0000000000]) {
					linear_extrude(height = 686.1000000000) {
						polygon(paths = [[0, 1, 2, 3]], points = [[195, 1535], [195, 1705], [365, 1705], [365, 1535]]);
					}
				}
			}
			color(c = [0.1000000000, 0.1000000000, 0.1000000000]) {
				translate(v = [0, 0, 1490.0000000000]) {
					linear_extrude(height = 686.1000000000) {
						polygon(paths = [[0, 1, 2, 3]], points = [[1035, 1535], [1035, 1705], [1205, 1705], [1205, 1535]]);
					}
				}
			}
			color(c = [0.1000000000, 0.1000000000, 0.1000000000]) {
				translate(v = [0, 0, 1490.0000000000]) {
					linear_extrude(height = 686.1000000000) {
						polygon(paths = [[0, 1, 2, 3]], points = [[1455, 1535], [1455, 1705], [1625, 1705], [1625, 1535]]);
					}
				}
			}
			color(c = [0.1000000000, 0.1000000000, 0.1000000000]) {
				translate(v = [0, 0, 1490.0000000000]) {
					linear_extrude(height = 686.1000000000) {
						polygon(paths = [[0, 1, 2, 3]], points = [[195, 1875], [195, 2045], [365, 2045], [365, 1875]]);
					}
				}
			}
			color(c = [0.1000000000, 0.1000000000, 0.1000000000]) {
				translate(v = [0, 0, 1490.0000000000]) {
					linear_extrude(height = 686.1000000000) {
						polygon(paths = [[0, 1, 2, 3]], points = [[1035, 1875], [1035, 2045], [1205, 2045], [1205, 1875]]);
					}
				}
			}
			color(c = [0.1000000000, 0.1000000000, 0.1000000000]) {
				translate(v = [0, 0, 1490.0000000000]) {
					linear_extrude(height = 686.1000000000) {
						polygon(paths = [[0, 1, 2, 3]], points = [[1455, 1875], [1455, 2045], [1625, 2045], [1625, 1875]]);
					}
				}
			}
			color(c = [0.1000000000, 0.1000000000, 0.1000000000]) {
				translate(v = [0, 0, 1490.0000000000]) {
					linear_extrude(height = 686.1000000000) {
						polygon(paths = [[0, 1, 2, 3]], points = [[615, 1915], [615, 2085], [785, 2085], [785, 1915]]);
					}
				}
			}
			color(c = [0.1000000000, 0.1000000000, 0.1000000000]) {
				translate(v = [0, 0, 1490.0000000000]) {
					linear_extrude(height = 686.1000000000) {
						polygon(paths = [[0, 1, 2, 3]], points = [[1875, 1915], [1875, 2085], [2045, 2085], [2045, 1915]]);
					}
				}
			}
			color(c = [0.1000000000, 0.1000000000, 0.1000000000]) {
				translate(v = [0, 0, 1490.0000000000]) {
					linear_extrude(height = 686.1000000000) {
						polygon(paths = [[0, 1, 2, 3]], points = [[195, 2215], [195, 2385], [365, 2385], [365, 2215]]);
					}
				}
			}
			color(c = [0.1000000000, 0.1000000000, 0.1000000000]) {
				translate(v = [0, 0, 1490.0000000000]) {
					linear_extrude(height = 686.1000000000) {
						polygon(paths = [[0, 1, 2, 3]], points = [[1035, 2215], [1035, 2385], [1205, 2385], [1205, 2215]]);
					}
				}
			}
			color(c = [0.1000000000, 0.1000000000, 0.1000000000]) {
				translate(v = [0, 0, 1490.0000000000]) {
					linear_extrude(height = 686.1000000000) {
						polygon(paths = [[0, 1, 2, 3]], points = [[615, 2255], [615, 2425], [785, 2425], [785, 2255]]);
					}
				}
			}
			color(c = [0.1000000000, 0.1000000000, 0.1000000000]) {
				translate(v = [0, 0, 1490.0000000000]) {
					linear_extrude(height = 686.1000000000) {
						polygon(paths = [[0, 1, 2, 3]], points = [[1875, 2255], [1875, 2425], [2045, 2425], [2045, 2255]]);
					}
				}
			}
			color(c = [0.9000000000, 0.6000000000, 0.6000000000]) {
				translate(v = [0, 0, 2176.1000000000]) {
					linear_extrude(height = 100.0000000000) {
						polygon(paths = [[0, 1, 2, 3, 4, 5, 6, 7, 8, 9, 10, 11, 12, 13, 14, 15]], points = [[0, -85], [0, 85], [90, 85], [90, 905], [365, 905], [365, 85], [1035, 85], [1035, 555], [1205, 555], [1205, 85], [1875, 85], [1875, 555], [2165, 555], [2165, 85], [2300, 85], [2300, -85]]);
					}
				}
			}
			color(c = [0.9000000000, 0.6000000000, 0.6000000000]) {
				translate(v = [0, 0, 2176.1000000000]) {
					linear_extrude(height = 100.0000000000) {
						polygon(paths = [[0, 1, 2, 3]], points = [[90, 1075], [90, 1275], [810, 1275], [810, 1075]]);
					}
				}
			}
			color(c = [0.9000000000, 0.6000000000, 0.6000000000]) {
				translate(v = [0, 0, 2176.1000000000]) {
					linear_extrude(height = 100.0000000000) {
						polygon(paths = [[0, 1, 2, 3]], points = [[980, 1075], [980, 1275], [1750, 1275], [1750, 1075]]);
					}
				}
			}
			color(c = [0.9000000000, 0.6000000000, 0.6000000000]) {
				translate(v = [0, 0, 2176.1000000000]) {
					linear_extrude(height = 100.0000000000) {
						polygon(paths = [[0, 1, 2, 3, 4, 5, 6, 7, 8, 9, 10, 11, 12, 13, 14, 15]], points = [[535, 255], [535, 905], [1920, 905], [1920, 1445], [1375, 1445], [1375, 2125], [1705, 2125], [1705, 1665], [2135, 1665], [2135, 735], [1705, 735], [1705, 255], [1375, 255], [1375, 725], [865, 725], [865, 255]]);
					}
				}
			}
			color(c = [0.9000000000, 0.6000000000, 0.6000000000]) {
				translate(v = [0, 0, 2176.1000000000]) {
					linear_extrude(height = 100.0000000000) {
						polygon(paths = [[0, 1, 2, 3, 4, 5, 6, 7, 8, 9, 10, 11]], points = [[90, 1455], [90, 2465], [365, 2465], [365, 1665], [1035, 1665], [1035, 2465], [2175, 2465], [2175, 1835], [1875, 1835], [1875, 2295], [1205, 2295], [1205, 1455]]);
					}
				}
			}
			color(c = [0.9000000000, 0.6000000000, 0.6000000000]) {
				translate(v = [0, 0, 2176.1000000000]) {
					linear_extrude(height = 100.0000000000) {
						polygon(paths = [[0, 1, 2, 3, 4, 5, 6, 7]], points = [[535, 1835], [535, 2635], [0, 2635], [0, 2805], [2300, 2805], [2300, 2635], [865, 2635], [865, 1835]]);
					}
				}
			}
			color(c = [0.5000000000, 0.5000000000, 0.5000000000]) {
				translate(v = [0, 0, 2276.1000000000]) {
					linear_extrude(height = 340.0000000000) {
						polygon(paths = [[0, 1, 2, 3]], points = [[145, -85], [145, 85], [315, 85], [315, -85]]);
					}
				}
			}
			color(c = [0.5000000000, 0.5000000000, 0.5000000000]) {
				translate(v = [0, 0, 2276.1000000000]) {
					linear_extrude(height = 340.0000000000) {
						polygon(paths = [[0, 1, 2, 3]], points = [[605, -85], [605, 85], [775, 85], [775, -85]]);
					}
				}
			}
			color(c = [0.5000000000, 0.5000000000, 0.5000000000]) {
				translate(v = [0, 0, 2276.1000000000]) {
					linear_extrude(height = 340.0000000000) {
						polygon(paths = [[0, 1, 2, 3]], points = [[1065, -85], [1065, 85], [1235, 85], [1235, -85]]);
					}
				}
			}
			color(c = [0.5000000000, 0.5000000000, 0.5000000000]) {
				translate(v = [0, 0, 2276.1000000000]) {
					linear_extrude(height = 340.0000000000) {
						polygon(paths = [[0, 1, 2, 3]], points = [[1525, -85], [1525, 85], [1695, 85], [1695, -85]]);
					}
				}
			}
			color(c = [0.5000000000, 0.5000000000, 0.5000000000]) {
				translate(v = [0, 0, 2276.1000000000]) {
					linear_extrude(height = 340.0000000000) {
						polygon(paths = [[0, 1, 2, 3]], points = [[1985, -85], [1985, 85], [2155, 85], [2155, -85]]);
					}
				}
			}
			color(c = [0.5000000000, 0.5000000000, 0.5000000000]) {
				translate(v = [0, 0, 2276.1000000000]) {
					linear_extrude(height = 340.0000000000) {
						polygon(paths = [[0, 1, 2, 3]], points = [[145, 2635], [145, 2805], [315, 2805], [315, 2635]]);
					}
				}
			}
			color(c = [0.5000000000, 0.5000000000, 0.5000000000]) {
				translate(v = [0, 0, 2276.1000000000]) {
					linear_extrude(height = 340.0000000000) {
						polygon(paths = [[0, 1, 2, 3]], points = [[605, 2635], [605, 2805], [775, 2805], [775, 2635]]);
					}
				}
			}
			color(c = [0.5000000000, 0.5000000000, 0.5000000000]) {
				translate(v = [0, 0, 2276.1000000000]) {
					linear_extrude(height = 340.0000000000) {
						polygon(paths = [[0, 1, 2, 3]], points = [[1065, 2635], [1065, 2805], [1235, 2805], [1235, 2635]]);
					}
				}
			}
			color(c = [0.5000000000, 0.5000000000, 0.5000000000]) {
				translate(v = [0, 0, 2276.1000000000]) {
					linear_extrude(height = 340.0000000000) {
						polygon(paths = [[0, 1, 2, 3]], points = [[1525, 2635], [1525, 2805], [1695, 2805], [1695, 2635]]);
					}
				}
			}
			color(c = [0.5000000000, 0.5000000000, 0.5000000000]) {
				translate(v = [0, 0, 2276.1000000000]) {
					linear_extrude(height = 340.0000000000) {
						polygon(paths = [[0, 1, 2, 3]], points = [[1985, 2635], [1985, 2805], [2155, 2805], [2155, 2635]]);
					}
				}
			}
			color(c = [0.3000000000, 0.3000000000, 1]) {
				translate(v = [0, 0, 2616.1000000000]) {
					linear_extrude(height = 360.0000000000) {
						polygon(paths = [[0, 1, 2, 3]], points = [[0, -240], [0, 240], [2300, 240], [2300, -240]]);
					}
				}
			}
			color(c = [0.3000000000, 0.3000000000, 1]) {
				translate(v = [0, 0, 2616.1000000000]) {
					linear_extrude(height = 360.0000000000) {
						polygon(paths = [[0, 1, 2, 3]], points = [[0, 2480], [0, 2960], [2300, 2960], [2300, 2480]]);
					}
				}
			}
		}
	}
}
